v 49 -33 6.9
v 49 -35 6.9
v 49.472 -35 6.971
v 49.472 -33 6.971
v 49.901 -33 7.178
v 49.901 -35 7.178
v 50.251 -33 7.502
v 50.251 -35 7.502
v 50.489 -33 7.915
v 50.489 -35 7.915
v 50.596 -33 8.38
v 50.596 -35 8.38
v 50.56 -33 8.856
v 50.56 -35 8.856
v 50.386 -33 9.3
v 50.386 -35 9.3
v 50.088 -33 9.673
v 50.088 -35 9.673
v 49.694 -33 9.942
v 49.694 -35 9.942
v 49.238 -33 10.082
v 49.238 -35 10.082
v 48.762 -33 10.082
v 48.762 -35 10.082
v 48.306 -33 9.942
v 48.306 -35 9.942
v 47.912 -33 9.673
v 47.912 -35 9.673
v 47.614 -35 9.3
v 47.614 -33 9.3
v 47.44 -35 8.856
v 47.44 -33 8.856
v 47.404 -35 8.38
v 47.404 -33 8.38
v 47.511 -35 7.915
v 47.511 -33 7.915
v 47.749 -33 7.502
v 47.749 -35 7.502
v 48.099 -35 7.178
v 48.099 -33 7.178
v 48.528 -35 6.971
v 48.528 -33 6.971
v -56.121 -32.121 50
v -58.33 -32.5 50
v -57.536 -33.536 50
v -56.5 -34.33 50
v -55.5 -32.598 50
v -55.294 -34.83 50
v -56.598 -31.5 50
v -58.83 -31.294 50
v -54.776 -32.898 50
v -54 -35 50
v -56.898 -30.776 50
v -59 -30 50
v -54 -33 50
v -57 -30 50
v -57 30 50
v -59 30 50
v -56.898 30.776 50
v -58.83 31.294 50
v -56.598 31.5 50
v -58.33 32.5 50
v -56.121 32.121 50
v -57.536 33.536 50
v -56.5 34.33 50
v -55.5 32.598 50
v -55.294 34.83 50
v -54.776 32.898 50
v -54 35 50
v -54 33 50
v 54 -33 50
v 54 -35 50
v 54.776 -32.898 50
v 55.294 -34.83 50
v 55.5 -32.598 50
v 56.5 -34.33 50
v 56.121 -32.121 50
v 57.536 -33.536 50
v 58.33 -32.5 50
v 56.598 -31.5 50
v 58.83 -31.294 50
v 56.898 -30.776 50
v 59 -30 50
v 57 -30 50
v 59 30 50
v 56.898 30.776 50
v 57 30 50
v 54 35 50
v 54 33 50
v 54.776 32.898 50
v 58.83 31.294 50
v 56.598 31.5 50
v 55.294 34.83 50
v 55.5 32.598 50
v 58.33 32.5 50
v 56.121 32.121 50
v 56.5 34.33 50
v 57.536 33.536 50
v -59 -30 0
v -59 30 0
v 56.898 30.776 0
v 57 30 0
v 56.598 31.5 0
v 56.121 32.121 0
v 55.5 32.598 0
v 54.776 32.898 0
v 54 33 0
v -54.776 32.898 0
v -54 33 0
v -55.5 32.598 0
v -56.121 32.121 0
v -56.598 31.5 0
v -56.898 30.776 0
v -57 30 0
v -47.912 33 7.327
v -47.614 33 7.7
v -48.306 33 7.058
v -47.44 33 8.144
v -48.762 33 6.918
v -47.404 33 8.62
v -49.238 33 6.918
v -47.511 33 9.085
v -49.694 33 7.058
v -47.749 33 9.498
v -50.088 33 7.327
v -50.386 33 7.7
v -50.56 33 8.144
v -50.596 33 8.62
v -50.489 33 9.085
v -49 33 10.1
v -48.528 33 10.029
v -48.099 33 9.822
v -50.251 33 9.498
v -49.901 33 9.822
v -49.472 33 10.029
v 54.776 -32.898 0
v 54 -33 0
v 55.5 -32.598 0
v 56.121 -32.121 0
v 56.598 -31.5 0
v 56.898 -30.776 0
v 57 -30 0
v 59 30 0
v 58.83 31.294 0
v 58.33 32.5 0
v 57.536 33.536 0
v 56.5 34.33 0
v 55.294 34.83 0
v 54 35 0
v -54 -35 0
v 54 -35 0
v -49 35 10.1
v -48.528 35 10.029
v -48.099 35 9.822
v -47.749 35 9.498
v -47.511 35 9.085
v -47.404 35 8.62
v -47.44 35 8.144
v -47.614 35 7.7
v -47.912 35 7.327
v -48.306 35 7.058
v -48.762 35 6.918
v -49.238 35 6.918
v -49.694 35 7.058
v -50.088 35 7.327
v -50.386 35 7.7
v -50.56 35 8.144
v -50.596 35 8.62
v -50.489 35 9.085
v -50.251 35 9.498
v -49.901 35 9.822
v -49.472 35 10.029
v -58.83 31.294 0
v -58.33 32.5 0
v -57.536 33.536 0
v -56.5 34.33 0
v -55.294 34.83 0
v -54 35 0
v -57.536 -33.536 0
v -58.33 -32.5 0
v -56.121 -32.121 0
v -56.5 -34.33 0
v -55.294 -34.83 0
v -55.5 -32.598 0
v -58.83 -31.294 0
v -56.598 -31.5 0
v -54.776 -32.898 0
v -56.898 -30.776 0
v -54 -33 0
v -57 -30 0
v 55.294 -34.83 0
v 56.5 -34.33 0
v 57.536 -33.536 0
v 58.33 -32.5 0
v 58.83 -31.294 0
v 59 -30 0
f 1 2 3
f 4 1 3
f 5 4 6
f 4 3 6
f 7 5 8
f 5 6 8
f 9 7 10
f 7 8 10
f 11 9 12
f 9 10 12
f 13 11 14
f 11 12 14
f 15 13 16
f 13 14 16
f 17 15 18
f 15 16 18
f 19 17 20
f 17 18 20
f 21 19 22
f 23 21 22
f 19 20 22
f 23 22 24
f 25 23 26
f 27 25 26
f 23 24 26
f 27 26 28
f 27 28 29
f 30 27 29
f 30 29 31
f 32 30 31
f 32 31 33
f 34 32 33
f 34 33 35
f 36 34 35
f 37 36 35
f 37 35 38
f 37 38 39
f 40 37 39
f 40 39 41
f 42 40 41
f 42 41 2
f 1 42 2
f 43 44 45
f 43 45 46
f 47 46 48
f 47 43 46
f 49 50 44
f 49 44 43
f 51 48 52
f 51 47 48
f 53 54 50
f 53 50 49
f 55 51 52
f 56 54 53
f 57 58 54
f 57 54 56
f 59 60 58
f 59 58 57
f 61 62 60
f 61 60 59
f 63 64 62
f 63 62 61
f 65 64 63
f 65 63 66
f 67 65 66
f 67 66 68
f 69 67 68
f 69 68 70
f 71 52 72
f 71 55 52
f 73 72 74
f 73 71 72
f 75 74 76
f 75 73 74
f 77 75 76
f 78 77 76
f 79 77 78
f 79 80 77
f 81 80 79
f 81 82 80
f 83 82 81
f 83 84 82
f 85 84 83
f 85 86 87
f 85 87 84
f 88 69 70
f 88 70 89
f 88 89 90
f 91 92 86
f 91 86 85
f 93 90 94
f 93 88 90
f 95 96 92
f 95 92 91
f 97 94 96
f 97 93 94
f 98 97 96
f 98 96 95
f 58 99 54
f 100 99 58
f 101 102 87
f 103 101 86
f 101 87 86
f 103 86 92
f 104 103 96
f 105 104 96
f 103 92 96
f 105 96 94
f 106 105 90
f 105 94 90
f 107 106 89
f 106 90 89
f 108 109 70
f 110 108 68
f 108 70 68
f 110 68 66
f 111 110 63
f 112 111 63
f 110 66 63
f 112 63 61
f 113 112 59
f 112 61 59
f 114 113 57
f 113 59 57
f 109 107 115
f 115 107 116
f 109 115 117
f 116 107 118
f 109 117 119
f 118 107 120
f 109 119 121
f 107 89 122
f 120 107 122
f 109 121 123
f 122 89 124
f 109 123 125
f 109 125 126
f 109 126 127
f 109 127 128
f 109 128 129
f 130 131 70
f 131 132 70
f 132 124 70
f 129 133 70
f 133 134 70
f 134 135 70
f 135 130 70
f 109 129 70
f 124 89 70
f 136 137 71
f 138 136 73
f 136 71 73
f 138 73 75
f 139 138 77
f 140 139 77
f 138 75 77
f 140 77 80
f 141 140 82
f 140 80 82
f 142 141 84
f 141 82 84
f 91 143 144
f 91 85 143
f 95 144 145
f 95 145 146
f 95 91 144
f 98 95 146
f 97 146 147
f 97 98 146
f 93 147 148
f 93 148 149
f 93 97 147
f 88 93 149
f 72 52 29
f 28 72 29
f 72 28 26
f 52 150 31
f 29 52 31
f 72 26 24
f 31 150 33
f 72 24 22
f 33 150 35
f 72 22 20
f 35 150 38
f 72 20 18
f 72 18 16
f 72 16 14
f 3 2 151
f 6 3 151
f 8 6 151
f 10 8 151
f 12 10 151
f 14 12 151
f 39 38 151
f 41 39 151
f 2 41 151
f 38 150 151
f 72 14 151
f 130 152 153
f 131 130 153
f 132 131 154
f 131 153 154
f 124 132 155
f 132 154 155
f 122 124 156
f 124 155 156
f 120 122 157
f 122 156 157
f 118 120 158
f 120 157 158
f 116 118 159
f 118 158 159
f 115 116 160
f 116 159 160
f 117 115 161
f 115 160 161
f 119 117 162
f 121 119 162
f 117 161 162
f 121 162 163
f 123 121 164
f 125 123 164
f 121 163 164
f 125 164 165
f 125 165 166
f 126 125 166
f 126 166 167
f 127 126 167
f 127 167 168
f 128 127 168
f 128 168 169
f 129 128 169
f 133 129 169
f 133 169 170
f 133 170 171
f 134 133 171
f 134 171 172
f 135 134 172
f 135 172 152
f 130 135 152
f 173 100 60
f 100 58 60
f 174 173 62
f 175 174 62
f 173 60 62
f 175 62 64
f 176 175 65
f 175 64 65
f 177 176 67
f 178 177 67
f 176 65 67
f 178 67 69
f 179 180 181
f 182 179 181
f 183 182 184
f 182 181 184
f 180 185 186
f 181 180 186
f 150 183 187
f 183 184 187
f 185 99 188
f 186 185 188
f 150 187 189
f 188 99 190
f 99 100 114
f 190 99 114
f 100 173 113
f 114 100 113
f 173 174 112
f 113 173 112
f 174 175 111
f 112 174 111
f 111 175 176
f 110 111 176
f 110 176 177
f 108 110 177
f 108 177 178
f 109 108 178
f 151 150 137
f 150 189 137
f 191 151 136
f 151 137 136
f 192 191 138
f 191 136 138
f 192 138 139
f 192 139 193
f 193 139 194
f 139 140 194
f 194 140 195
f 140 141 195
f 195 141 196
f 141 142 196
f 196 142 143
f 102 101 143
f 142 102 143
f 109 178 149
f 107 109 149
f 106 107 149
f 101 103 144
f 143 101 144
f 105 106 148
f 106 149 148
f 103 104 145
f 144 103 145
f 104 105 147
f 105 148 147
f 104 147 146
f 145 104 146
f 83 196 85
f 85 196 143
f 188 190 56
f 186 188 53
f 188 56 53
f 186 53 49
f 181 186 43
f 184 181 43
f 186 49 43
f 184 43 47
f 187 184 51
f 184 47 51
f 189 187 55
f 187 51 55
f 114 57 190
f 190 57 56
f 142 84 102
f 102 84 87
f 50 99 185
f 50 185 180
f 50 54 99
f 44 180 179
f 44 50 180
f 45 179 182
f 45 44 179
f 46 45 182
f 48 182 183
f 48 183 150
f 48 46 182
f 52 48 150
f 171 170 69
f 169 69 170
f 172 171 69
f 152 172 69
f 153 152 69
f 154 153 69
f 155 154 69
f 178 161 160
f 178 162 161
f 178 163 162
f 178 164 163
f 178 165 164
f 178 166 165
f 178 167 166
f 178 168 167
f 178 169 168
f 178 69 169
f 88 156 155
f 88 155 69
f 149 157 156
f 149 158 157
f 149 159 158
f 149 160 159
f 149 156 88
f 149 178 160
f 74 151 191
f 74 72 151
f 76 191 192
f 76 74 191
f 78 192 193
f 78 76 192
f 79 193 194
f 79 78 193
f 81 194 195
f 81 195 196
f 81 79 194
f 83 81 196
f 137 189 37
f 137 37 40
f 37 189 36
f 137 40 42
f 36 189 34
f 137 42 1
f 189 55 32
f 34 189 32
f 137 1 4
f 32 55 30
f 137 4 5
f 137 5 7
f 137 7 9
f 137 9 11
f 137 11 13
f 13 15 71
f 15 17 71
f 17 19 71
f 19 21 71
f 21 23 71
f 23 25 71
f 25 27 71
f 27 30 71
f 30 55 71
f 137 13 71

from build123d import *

# Parameters (mm, degrees)
SKETCH_1_W          = 118
SKETCH_1_H          = 70
EXTRUDE_1_DEPTH     = 50
FILLET_1_R          = 5
CUT_EXTRUDE_1_DEPTH = 85.888161719
CUT_EXTRUDE_2_REACH = 106.312
SKETCH_3_R          = 1.6
SKETCH_4_R          = 1.6
CUT_EXTRUDE_3_DEPTH = 50


with BuildPart() as part:
    # ｽｹｯﾁ1 → ﾎﾞｽ - 押し出し1 (new body)
    with BuildSketch(Plane.XY):
        Rectangle(SKETCH_1_W, SKETCH_1_H)
    extrude(amount=EXTRUDE_1_DEPTH)

    # ﾌｨﾚｯﾄ1
    fillet_1_edges = [part.edges().sort_by_distance(p)[0] for p in [
        (59, -35, 25),
        (-59, -35, 25),
        (-59, 35, 25),
        (59, 35, 25),
    ]]
    fillet(fillet_1_edges, radius=FILLET_1_R)

    # ｽｹｯﾁ2 → ｶｯﾄ - 押し出し1 (cut, through all)
    with BuildSketch(Plane.XY.offset(50)):
        with BuildLine():
            Line((-54, -33), (54, -33))
            ThreePointArc((54, -33), (56.121320344, -32.121320344), (57, -30))
            Line((57, -30), (57, 30))
            ThreePointArc((57, 30), (56.121320344, 32.121320344), (54, 33))
            Line((54, 33), (-54, 33))
            ThreePointArc((-54, 33), (-56.121320344, 32.121320344), (-57, 30))
            Line((-57, 30), (-57, -30))
            ThreePointArc((-57, -30), (-56.121320344, -32.121320344), (-54, -33))
        make_face()
    extrude(amount=-CUT_EXTRUDE_1_DEPTH, mode=Mode.SUBTRACT)

    # ｽｹｯﾁ3 → ｶｯﾄ - 押し出し2 (cut, up to next)
    with BuildSketch(Plane.XZ.offset(35), mode=Mode.PRIVATE) as cut_extrude_2_sk1:
        with Locations(Location((49, 8.5, 0), (0, 0, 270))):
            Circle(SKETCH_3_R)
    cut_extrude_2_tool1 = extrude(cut_extrude_2_sk1.sketch, amount=-CUT_EXTRUDE_2_REACH, mode=Mode.PRIVATE) & part.part
    add(cut_extrude_2_tool1.solids().sort_by_distance((49, -35, 8.5))[0], mode=Mode.SUBTRACT)

    # ｽｹｯﾁ4 → ｶｯﾄ - 押し出し3 (cut)
    with BuildSketch(Plane(origin=(0, 35, 0), x_dir=(1, 0, 0), z_dir=(0, 1, 0))):
        with Locations(Location((-49, -8.5, 0), (0, 0, 270))):
            Circle(SKETCH_4_R)
    extrude(amount=-CUT_EXTRUDE_3_DEPTH, mode=Mode.SUBTRACT)


solid = part.part
